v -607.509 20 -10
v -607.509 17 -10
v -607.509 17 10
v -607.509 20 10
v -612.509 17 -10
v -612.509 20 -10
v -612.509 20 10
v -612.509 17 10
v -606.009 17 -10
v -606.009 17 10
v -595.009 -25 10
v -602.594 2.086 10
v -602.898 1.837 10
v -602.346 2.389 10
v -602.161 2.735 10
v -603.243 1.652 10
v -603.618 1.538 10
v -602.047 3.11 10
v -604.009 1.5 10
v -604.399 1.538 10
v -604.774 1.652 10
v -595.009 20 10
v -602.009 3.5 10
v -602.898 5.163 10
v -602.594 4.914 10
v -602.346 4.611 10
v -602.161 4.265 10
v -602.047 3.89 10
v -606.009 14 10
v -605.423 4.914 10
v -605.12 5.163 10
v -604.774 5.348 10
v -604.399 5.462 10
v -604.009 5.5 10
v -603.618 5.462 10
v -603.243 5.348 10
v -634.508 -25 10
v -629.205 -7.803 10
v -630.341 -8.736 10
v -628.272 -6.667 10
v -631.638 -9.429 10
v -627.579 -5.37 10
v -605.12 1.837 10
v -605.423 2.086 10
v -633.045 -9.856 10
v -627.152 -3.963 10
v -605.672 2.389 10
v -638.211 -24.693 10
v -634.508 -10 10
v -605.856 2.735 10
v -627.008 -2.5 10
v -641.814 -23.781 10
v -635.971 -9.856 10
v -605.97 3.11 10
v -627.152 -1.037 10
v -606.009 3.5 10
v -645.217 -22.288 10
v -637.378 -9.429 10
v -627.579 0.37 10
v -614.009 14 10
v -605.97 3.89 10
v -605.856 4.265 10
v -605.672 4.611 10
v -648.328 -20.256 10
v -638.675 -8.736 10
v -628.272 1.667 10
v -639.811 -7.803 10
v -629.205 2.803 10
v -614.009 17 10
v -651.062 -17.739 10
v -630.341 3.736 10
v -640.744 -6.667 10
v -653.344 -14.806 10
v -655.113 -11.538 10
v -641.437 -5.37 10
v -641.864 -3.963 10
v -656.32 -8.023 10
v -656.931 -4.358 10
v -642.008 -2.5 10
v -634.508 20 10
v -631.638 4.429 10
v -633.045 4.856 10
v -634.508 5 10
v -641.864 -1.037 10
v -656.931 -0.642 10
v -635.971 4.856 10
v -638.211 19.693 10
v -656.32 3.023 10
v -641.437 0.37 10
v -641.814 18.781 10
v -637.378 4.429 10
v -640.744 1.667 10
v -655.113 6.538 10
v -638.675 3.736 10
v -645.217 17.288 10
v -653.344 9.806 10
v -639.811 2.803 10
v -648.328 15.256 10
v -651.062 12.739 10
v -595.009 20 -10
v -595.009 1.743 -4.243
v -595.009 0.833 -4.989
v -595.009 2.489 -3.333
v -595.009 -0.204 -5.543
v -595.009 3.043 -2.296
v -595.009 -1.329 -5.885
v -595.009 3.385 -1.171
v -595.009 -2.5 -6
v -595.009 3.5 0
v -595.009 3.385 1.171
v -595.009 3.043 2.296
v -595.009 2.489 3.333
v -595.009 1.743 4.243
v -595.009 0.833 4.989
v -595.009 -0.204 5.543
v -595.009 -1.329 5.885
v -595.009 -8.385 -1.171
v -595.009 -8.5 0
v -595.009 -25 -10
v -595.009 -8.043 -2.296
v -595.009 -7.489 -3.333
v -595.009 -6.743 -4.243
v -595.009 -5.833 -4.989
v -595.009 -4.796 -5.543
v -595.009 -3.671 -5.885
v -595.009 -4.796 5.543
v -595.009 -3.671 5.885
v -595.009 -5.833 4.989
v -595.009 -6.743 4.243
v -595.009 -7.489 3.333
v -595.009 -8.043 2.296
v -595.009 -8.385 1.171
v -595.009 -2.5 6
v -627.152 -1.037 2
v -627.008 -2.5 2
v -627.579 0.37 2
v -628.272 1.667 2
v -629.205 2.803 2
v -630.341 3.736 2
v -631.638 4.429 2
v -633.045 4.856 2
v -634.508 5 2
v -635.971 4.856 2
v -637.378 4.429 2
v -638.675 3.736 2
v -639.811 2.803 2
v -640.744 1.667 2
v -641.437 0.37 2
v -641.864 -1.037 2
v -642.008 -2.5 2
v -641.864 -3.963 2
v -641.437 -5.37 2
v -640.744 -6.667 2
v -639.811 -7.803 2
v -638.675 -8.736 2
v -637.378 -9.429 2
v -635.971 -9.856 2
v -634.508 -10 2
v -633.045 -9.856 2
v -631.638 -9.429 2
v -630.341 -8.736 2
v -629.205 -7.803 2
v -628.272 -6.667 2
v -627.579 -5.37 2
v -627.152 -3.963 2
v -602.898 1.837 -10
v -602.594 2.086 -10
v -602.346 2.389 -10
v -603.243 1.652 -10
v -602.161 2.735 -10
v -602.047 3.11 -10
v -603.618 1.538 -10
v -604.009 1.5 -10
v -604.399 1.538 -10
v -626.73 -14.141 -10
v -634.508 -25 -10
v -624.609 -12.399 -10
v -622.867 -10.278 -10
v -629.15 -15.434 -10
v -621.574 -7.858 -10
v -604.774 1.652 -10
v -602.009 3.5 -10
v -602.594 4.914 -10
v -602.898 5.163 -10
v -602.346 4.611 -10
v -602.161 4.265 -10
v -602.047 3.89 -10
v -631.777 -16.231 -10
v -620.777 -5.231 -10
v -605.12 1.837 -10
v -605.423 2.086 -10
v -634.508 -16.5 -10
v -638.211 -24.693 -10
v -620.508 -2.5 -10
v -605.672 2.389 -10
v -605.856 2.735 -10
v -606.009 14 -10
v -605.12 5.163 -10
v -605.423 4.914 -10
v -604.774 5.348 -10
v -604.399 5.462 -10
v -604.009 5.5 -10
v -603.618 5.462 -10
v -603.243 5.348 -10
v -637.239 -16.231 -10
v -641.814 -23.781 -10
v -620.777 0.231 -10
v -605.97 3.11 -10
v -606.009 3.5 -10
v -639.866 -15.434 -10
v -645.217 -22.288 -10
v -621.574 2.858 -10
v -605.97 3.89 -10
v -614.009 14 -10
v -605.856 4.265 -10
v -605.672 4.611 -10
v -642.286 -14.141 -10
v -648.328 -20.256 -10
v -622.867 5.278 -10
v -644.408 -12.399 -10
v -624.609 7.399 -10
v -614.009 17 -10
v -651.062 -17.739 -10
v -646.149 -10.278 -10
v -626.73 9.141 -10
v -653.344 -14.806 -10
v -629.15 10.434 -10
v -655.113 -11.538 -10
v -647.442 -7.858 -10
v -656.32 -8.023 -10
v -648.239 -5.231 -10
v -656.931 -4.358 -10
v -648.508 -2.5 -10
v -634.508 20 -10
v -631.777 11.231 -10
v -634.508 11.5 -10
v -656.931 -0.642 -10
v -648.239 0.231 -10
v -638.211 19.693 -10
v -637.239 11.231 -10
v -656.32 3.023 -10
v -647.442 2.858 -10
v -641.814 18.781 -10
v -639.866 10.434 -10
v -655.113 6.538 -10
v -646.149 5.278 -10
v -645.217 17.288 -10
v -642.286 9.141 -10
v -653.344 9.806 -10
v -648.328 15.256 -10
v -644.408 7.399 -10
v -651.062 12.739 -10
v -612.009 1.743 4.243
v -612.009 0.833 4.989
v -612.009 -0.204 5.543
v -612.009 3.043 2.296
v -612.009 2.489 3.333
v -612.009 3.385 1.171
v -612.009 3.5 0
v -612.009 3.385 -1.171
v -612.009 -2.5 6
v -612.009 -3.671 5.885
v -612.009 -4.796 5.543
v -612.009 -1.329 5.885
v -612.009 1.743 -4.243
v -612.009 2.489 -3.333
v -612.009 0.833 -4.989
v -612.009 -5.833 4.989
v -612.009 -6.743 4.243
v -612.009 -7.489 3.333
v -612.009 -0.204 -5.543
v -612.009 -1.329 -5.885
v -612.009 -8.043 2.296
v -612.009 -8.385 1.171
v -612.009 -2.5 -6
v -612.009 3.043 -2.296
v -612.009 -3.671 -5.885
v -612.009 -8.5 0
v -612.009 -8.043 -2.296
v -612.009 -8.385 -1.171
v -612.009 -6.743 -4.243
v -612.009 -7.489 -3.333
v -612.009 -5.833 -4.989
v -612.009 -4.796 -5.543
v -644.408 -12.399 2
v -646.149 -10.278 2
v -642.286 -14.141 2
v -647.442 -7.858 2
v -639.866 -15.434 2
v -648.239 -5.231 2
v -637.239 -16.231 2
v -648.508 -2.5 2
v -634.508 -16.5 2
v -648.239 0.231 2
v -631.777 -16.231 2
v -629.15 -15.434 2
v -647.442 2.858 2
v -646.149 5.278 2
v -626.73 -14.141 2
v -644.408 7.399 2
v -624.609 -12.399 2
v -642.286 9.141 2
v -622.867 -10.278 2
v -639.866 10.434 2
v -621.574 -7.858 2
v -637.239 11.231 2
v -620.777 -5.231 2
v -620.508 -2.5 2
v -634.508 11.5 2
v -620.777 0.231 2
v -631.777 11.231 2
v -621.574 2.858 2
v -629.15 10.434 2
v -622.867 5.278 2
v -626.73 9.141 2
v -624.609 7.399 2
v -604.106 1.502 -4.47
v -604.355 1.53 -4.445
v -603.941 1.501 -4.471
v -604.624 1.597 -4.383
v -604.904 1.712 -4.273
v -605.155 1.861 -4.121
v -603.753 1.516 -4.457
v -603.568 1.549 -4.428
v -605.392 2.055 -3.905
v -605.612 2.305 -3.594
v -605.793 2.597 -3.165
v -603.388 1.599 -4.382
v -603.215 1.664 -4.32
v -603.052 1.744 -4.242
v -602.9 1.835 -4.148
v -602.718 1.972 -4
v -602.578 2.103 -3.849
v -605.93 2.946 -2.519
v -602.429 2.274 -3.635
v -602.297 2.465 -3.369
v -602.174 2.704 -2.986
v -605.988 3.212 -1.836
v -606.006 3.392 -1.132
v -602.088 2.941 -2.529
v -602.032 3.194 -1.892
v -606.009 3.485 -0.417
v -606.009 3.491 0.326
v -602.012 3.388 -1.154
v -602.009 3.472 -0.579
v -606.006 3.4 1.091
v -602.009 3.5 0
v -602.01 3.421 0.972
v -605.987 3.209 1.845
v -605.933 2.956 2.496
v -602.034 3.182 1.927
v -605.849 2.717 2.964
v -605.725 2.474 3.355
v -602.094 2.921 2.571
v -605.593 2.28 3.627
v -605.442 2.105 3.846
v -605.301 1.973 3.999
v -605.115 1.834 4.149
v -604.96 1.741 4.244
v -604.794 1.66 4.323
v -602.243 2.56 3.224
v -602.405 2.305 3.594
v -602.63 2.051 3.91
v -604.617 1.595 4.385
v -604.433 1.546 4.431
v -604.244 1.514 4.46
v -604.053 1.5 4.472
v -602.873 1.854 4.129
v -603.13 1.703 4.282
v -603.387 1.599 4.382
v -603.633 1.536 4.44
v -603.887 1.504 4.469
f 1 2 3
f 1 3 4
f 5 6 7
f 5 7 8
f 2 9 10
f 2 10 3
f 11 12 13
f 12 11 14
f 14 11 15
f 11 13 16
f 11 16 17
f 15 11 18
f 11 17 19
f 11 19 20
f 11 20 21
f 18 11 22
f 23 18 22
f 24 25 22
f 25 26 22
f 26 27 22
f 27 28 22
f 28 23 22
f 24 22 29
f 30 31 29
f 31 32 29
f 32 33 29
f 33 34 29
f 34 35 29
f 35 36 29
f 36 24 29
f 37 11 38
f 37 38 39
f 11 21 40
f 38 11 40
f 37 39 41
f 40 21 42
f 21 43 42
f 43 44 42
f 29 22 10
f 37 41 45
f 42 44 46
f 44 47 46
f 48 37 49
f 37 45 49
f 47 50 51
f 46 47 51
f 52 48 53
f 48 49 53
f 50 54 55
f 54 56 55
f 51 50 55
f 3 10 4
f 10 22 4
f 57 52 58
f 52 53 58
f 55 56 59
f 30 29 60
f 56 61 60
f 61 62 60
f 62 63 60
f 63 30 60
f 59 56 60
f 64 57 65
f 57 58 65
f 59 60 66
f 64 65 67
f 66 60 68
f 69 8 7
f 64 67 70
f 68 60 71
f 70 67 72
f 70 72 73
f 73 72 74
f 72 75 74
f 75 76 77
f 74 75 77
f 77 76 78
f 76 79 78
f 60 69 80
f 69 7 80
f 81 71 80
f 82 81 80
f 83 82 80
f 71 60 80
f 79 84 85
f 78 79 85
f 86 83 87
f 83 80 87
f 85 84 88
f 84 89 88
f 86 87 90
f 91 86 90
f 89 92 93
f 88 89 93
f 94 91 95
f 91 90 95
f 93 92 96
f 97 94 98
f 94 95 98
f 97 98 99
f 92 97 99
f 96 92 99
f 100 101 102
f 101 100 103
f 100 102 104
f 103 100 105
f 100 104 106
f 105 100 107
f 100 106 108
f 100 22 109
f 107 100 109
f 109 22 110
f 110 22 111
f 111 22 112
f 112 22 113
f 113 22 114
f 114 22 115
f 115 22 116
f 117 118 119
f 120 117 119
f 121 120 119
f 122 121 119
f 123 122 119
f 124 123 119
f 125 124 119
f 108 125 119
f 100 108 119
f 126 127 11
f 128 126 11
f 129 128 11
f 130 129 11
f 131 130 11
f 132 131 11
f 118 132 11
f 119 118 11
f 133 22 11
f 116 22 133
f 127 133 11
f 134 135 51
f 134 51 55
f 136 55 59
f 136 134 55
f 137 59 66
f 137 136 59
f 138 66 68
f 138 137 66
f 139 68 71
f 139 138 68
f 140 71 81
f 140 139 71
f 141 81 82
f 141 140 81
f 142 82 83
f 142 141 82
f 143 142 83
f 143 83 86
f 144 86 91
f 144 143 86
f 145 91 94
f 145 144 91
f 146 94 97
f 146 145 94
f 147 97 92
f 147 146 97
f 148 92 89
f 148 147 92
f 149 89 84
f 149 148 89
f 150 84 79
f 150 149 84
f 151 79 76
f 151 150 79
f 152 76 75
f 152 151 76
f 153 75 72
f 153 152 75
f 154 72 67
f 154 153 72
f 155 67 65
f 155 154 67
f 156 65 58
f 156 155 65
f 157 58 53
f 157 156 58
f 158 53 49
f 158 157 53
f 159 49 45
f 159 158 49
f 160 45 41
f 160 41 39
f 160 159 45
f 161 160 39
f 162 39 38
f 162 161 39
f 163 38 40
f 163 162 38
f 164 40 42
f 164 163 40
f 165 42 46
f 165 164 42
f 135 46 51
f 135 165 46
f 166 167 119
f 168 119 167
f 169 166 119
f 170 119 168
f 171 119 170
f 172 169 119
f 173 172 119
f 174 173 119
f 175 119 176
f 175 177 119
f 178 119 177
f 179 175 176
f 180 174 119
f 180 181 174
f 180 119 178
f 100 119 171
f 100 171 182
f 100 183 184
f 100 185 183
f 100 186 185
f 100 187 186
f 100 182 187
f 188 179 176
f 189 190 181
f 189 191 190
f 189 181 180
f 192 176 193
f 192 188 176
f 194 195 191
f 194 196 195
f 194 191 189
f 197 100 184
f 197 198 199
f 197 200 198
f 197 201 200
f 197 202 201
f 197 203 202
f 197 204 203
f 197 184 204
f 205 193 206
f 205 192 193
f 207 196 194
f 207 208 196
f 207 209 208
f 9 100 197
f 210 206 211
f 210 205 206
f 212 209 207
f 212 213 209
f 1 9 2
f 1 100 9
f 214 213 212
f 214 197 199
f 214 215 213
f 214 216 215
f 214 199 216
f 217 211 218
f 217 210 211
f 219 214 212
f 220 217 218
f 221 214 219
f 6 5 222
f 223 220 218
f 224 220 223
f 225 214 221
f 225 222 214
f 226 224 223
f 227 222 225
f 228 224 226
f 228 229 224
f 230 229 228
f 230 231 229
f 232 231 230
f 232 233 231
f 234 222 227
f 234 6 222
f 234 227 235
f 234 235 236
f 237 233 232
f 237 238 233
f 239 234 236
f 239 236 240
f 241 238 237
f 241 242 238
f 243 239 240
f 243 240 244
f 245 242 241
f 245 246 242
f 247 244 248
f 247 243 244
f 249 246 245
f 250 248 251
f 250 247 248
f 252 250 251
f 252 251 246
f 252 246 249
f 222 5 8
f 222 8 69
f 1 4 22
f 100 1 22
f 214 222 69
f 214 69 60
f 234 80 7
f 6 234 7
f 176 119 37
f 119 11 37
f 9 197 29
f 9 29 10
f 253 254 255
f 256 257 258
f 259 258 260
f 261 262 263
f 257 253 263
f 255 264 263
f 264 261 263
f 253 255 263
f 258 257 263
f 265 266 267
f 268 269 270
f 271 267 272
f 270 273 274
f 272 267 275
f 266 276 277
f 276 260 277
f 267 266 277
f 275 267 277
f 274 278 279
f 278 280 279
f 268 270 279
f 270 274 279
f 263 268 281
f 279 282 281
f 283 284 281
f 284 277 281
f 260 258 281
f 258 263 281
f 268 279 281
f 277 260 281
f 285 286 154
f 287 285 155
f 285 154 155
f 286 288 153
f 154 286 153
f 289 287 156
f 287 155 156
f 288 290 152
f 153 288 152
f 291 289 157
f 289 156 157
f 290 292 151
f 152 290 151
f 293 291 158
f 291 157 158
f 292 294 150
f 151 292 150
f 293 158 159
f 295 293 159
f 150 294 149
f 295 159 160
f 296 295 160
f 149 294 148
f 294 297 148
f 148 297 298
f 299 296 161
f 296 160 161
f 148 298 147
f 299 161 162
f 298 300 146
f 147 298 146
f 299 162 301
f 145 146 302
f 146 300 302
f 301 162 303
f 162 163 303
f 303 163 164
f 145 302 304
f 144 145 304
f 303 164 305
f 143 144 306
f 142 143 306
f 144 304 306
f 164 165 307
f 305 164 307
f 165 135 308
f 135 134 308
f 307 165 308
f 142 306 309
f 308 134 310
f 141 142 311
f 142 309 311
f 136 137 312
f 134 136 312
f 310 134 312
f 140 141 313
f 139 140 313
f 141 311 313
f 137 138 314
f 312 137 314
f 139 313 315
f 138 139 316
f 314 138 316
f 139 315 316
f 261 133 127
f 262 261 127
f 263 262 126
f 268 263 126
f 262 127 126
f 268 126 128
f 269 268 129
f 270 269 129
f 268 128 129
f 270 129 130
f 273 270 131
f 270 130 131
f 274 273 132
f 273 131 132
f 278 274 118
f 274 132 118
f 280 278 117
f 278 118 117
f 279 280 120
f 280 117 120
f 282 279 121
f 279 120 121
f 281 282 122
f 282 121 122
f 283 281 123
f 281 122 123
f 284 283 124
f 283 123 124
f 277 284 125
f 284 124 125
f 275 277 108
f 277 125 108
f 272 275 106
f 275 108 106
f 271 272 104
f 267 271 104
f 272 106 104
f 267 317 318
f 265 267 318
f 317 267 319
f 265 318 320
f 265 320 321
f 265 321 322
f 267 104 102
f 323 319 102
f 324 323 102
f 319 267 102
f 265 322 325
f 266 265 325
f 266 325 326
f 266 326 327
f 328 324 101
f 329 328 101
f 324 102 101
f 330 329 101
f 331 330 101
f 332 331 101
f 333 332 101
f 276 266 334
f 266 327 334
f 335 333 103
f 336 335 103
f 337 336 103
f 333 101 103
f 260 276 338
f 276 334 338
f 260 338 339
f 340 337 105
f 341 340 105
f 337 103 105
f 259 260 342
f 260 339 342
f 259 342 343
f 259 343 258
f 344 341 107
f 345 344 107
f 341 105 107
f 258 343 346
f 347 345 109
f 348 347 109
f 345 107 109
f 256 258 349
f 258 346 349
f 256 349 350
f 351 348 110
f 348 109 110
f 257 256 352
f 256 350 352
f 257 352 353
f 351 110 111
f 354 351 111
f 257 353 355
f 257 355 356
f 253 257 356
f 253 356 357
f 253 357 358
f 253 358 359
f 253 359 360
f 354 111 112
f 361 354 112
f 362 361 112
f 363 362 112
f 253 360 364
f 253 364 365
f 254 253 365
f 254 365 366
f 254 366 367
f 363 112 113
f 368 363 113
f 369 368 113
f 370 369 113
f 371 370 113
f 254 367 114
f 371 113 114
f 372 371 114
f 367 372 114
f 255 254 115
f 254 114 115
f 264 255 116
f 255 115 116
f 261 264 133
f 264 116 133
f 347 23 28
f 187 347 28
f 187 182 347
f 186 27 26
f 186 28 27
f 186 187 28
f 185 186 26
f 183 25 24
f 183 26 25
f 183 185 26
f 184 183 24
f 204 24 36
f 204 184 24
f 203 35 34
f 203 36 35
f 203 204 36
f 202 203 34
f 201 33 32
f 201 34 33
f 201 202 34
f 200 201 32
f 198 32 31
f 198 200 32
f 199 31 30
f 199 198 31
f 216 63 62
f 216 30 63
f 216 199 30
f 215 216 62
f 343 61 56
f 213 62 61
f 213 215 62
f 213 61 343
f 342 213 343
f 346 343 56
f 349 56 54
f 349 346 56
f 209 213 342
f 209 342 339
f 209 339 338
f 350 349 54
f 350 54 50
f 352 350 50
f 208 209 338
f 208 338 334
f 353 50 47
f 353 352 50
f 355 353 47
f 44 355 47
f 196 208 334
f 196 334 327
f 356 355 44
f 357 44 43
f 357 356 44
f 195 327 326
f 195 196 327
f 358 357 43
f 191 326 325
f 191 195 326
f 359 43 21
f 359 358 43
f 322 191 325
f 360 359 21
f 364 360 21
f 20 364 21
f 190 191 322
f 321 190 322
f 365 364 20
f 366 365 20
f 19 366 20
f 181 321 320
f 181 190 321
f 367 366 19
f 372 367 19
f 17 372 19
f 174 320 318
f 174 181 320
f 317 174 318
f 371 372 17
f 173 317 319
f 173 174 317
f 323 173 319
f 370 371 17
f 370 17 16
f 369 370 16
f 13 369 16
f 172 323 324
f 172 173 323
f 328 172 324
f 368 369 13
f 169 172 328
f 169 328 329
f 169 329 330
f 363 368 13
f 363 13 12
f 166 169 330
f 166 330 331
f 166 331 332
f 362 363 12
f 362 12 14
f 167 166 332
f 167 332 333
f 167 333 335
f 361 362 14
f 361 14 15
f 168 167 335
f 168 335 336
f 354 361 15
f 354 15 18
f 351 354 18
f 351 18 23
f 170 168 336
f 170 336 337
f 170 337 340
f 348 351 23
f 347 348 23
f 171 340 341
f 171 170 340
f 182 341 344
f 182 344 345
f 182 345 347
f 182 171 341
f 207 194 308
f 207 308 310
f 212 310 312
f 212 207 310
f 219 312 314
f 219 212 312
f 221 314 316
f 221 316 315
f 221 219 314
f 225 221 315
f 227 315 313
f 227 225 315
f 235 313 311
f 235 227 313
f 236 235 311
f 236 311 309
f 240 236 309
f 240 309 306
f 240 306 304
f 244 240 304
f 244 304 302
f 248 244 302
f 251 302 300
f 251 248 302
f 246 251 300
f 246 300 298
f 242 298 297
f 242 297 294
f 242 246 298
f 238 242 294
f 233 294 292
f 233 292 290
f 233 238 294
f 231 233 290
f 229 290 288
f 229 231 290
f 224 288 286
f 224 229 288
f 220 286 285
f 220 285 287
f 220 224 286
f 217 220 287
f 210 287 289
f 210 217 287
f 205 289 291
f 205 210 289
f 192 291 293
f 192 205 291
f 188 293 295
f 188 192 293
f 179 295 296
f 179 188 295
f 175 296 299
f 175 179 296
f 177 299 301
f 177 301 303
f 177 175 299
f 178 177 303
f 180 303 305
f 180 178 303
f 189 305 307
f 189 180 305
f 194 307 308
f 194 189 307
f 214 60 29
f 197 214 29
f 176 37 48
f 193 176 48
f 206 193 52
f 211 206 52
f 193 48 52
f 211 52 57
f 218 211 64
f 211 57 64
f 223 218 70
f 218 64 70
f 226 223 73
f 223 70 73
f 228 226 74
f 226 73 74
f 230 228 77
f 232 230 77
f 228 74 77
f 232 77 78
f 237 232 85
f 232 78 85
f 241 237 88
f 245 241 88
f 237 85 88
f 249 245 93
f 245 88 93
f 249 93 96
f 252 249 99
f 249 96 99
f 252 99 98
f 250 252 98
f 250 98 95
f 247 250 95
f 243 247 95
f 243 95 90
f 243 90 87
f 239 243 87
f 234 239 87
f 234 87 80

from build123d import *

# Parameters (mm, degrees)
ESQUISSE1_R                  = 7.5
BOSS_EXTRU_1_DEPTH           = 10
ESQUISSE1_3_W                = 17
ESQUISSE1_3_H                = 6
ENL_V_MAT_EXTRU_1_DEPTH      = 2
ENL_V_MAT_EXTRU_1_DEPTH_BACK = 10
ESQUISSE1_5_R                = 14
ENL_V_MAT_EXTRU_2_DEPTH      = 658.559578744
ENL_V_MAT_EXTRU_2_DEPTH_BACK = 658.559578744
ESQUISSE1_6_R                = 2
ENL_V_MAT_EXTRU_3_DEPTH      = 658.559578745
ENL_V_MAT_EXTRU_3_DEPTH_BACK = 658.559578745


with BuildPart() as part:
    # Esquisse1 → Boss.-Extru.1 (new, symmetric)
    with BuildSketch(Plane.XY):
        with BuildLine():
            Line((-634.508066615, 20), (-595.008671928, 20))
            Line((-595.008671928, 20), (-595.008671928, -25))
            Line((-595.008671928, -25), (-634.508066615, -25))
            ThreePointArc((-634.508066615, -25), (-657.008066615, -2.5), (-634.508066615, 20))
        make_face()
        with Locations((-634.508066615, -2.5)):
            Circle(ESQUISSE1_R, mode=Mode.SUBTRACT)
    extrude(amount=BOSS_EXTRU_1_DEPTH, both=True)

    # Esquisse1<3> → Enlèvement de matière-Révolution1 (revolve, cut)
    with BuildSketch(Plane.XY):
        with Locations((-603.508671928, 0.5)):
            Rectangle(ESQUISSE1_3_W, ESQUISSE1_3_H)
    revolve(axis=Axis((-666.113025571, -2.5, 0), (1, 0, 0)), mode=Mode.SUBTRACT)

    # Esquisse1<5> → Enlèv. mat.-Extru.1 (cut, two sides: drawn at the far end of the back side and taken through both)
    with BuildSketch(Plane.XY.offset(-ENL_V_MAT_EXTRU_1_DEPTH_BACK)):
        with Locations((-634.508066615, -2.5)):
            Circle(ESQUISSE1_5_R)
    extrude(amount=ENL_V_MAT_EXTRU_1_DEPTH + ENL_V_MAT_EXTRU_1_DEPTH_BACK, mode=Mode.SUBTRACT)

    # Esquisse1<6> → Enlèv. mat.-Extru.2 (cut, two sides: drawn at the far end of the back side and taken through both)
    with BuildSketch(Plane.XY.offset(-ENL_V_MAT_EXTRU_2_DEPTH_BACK)):
        with Locations((-604.008671928, 3.5)):
            Circle(ESQUISSE1_6_R)
    extrude(amount=ENL_V_MAT_EXTRU_2_DEPTH + ENL_V_MAT_EXTRU_2_DEPTH_BACK, mode=Mode.SUBTRACT)

    # Esquisse1<7> → Enlèv. mat.-Extru.3 (cut, two sides: drawn at the far end of the back side and taken through both)
    with BuildSketch(Plane.XY.offset(-ENL_V_MAT_EXTRU_3_DEPTH_BACK)):
        Polygon((-607.508671928, 20), (-612.508671928, 20), (-612.508671928, 17), (-614.008671928, 17), (-614.008671928, 14), (-606.008671928, 14), (-606.008671928, 17), (-607.508671928, 17), align=None)
    extrude(amount=ENL_V_MAT_EXTRU_3_DEPTH + ENL_V_MAT_EXTRU_3_DEPTH_BACK, mode=Mode.SUBTRACT)


solid = part.part
